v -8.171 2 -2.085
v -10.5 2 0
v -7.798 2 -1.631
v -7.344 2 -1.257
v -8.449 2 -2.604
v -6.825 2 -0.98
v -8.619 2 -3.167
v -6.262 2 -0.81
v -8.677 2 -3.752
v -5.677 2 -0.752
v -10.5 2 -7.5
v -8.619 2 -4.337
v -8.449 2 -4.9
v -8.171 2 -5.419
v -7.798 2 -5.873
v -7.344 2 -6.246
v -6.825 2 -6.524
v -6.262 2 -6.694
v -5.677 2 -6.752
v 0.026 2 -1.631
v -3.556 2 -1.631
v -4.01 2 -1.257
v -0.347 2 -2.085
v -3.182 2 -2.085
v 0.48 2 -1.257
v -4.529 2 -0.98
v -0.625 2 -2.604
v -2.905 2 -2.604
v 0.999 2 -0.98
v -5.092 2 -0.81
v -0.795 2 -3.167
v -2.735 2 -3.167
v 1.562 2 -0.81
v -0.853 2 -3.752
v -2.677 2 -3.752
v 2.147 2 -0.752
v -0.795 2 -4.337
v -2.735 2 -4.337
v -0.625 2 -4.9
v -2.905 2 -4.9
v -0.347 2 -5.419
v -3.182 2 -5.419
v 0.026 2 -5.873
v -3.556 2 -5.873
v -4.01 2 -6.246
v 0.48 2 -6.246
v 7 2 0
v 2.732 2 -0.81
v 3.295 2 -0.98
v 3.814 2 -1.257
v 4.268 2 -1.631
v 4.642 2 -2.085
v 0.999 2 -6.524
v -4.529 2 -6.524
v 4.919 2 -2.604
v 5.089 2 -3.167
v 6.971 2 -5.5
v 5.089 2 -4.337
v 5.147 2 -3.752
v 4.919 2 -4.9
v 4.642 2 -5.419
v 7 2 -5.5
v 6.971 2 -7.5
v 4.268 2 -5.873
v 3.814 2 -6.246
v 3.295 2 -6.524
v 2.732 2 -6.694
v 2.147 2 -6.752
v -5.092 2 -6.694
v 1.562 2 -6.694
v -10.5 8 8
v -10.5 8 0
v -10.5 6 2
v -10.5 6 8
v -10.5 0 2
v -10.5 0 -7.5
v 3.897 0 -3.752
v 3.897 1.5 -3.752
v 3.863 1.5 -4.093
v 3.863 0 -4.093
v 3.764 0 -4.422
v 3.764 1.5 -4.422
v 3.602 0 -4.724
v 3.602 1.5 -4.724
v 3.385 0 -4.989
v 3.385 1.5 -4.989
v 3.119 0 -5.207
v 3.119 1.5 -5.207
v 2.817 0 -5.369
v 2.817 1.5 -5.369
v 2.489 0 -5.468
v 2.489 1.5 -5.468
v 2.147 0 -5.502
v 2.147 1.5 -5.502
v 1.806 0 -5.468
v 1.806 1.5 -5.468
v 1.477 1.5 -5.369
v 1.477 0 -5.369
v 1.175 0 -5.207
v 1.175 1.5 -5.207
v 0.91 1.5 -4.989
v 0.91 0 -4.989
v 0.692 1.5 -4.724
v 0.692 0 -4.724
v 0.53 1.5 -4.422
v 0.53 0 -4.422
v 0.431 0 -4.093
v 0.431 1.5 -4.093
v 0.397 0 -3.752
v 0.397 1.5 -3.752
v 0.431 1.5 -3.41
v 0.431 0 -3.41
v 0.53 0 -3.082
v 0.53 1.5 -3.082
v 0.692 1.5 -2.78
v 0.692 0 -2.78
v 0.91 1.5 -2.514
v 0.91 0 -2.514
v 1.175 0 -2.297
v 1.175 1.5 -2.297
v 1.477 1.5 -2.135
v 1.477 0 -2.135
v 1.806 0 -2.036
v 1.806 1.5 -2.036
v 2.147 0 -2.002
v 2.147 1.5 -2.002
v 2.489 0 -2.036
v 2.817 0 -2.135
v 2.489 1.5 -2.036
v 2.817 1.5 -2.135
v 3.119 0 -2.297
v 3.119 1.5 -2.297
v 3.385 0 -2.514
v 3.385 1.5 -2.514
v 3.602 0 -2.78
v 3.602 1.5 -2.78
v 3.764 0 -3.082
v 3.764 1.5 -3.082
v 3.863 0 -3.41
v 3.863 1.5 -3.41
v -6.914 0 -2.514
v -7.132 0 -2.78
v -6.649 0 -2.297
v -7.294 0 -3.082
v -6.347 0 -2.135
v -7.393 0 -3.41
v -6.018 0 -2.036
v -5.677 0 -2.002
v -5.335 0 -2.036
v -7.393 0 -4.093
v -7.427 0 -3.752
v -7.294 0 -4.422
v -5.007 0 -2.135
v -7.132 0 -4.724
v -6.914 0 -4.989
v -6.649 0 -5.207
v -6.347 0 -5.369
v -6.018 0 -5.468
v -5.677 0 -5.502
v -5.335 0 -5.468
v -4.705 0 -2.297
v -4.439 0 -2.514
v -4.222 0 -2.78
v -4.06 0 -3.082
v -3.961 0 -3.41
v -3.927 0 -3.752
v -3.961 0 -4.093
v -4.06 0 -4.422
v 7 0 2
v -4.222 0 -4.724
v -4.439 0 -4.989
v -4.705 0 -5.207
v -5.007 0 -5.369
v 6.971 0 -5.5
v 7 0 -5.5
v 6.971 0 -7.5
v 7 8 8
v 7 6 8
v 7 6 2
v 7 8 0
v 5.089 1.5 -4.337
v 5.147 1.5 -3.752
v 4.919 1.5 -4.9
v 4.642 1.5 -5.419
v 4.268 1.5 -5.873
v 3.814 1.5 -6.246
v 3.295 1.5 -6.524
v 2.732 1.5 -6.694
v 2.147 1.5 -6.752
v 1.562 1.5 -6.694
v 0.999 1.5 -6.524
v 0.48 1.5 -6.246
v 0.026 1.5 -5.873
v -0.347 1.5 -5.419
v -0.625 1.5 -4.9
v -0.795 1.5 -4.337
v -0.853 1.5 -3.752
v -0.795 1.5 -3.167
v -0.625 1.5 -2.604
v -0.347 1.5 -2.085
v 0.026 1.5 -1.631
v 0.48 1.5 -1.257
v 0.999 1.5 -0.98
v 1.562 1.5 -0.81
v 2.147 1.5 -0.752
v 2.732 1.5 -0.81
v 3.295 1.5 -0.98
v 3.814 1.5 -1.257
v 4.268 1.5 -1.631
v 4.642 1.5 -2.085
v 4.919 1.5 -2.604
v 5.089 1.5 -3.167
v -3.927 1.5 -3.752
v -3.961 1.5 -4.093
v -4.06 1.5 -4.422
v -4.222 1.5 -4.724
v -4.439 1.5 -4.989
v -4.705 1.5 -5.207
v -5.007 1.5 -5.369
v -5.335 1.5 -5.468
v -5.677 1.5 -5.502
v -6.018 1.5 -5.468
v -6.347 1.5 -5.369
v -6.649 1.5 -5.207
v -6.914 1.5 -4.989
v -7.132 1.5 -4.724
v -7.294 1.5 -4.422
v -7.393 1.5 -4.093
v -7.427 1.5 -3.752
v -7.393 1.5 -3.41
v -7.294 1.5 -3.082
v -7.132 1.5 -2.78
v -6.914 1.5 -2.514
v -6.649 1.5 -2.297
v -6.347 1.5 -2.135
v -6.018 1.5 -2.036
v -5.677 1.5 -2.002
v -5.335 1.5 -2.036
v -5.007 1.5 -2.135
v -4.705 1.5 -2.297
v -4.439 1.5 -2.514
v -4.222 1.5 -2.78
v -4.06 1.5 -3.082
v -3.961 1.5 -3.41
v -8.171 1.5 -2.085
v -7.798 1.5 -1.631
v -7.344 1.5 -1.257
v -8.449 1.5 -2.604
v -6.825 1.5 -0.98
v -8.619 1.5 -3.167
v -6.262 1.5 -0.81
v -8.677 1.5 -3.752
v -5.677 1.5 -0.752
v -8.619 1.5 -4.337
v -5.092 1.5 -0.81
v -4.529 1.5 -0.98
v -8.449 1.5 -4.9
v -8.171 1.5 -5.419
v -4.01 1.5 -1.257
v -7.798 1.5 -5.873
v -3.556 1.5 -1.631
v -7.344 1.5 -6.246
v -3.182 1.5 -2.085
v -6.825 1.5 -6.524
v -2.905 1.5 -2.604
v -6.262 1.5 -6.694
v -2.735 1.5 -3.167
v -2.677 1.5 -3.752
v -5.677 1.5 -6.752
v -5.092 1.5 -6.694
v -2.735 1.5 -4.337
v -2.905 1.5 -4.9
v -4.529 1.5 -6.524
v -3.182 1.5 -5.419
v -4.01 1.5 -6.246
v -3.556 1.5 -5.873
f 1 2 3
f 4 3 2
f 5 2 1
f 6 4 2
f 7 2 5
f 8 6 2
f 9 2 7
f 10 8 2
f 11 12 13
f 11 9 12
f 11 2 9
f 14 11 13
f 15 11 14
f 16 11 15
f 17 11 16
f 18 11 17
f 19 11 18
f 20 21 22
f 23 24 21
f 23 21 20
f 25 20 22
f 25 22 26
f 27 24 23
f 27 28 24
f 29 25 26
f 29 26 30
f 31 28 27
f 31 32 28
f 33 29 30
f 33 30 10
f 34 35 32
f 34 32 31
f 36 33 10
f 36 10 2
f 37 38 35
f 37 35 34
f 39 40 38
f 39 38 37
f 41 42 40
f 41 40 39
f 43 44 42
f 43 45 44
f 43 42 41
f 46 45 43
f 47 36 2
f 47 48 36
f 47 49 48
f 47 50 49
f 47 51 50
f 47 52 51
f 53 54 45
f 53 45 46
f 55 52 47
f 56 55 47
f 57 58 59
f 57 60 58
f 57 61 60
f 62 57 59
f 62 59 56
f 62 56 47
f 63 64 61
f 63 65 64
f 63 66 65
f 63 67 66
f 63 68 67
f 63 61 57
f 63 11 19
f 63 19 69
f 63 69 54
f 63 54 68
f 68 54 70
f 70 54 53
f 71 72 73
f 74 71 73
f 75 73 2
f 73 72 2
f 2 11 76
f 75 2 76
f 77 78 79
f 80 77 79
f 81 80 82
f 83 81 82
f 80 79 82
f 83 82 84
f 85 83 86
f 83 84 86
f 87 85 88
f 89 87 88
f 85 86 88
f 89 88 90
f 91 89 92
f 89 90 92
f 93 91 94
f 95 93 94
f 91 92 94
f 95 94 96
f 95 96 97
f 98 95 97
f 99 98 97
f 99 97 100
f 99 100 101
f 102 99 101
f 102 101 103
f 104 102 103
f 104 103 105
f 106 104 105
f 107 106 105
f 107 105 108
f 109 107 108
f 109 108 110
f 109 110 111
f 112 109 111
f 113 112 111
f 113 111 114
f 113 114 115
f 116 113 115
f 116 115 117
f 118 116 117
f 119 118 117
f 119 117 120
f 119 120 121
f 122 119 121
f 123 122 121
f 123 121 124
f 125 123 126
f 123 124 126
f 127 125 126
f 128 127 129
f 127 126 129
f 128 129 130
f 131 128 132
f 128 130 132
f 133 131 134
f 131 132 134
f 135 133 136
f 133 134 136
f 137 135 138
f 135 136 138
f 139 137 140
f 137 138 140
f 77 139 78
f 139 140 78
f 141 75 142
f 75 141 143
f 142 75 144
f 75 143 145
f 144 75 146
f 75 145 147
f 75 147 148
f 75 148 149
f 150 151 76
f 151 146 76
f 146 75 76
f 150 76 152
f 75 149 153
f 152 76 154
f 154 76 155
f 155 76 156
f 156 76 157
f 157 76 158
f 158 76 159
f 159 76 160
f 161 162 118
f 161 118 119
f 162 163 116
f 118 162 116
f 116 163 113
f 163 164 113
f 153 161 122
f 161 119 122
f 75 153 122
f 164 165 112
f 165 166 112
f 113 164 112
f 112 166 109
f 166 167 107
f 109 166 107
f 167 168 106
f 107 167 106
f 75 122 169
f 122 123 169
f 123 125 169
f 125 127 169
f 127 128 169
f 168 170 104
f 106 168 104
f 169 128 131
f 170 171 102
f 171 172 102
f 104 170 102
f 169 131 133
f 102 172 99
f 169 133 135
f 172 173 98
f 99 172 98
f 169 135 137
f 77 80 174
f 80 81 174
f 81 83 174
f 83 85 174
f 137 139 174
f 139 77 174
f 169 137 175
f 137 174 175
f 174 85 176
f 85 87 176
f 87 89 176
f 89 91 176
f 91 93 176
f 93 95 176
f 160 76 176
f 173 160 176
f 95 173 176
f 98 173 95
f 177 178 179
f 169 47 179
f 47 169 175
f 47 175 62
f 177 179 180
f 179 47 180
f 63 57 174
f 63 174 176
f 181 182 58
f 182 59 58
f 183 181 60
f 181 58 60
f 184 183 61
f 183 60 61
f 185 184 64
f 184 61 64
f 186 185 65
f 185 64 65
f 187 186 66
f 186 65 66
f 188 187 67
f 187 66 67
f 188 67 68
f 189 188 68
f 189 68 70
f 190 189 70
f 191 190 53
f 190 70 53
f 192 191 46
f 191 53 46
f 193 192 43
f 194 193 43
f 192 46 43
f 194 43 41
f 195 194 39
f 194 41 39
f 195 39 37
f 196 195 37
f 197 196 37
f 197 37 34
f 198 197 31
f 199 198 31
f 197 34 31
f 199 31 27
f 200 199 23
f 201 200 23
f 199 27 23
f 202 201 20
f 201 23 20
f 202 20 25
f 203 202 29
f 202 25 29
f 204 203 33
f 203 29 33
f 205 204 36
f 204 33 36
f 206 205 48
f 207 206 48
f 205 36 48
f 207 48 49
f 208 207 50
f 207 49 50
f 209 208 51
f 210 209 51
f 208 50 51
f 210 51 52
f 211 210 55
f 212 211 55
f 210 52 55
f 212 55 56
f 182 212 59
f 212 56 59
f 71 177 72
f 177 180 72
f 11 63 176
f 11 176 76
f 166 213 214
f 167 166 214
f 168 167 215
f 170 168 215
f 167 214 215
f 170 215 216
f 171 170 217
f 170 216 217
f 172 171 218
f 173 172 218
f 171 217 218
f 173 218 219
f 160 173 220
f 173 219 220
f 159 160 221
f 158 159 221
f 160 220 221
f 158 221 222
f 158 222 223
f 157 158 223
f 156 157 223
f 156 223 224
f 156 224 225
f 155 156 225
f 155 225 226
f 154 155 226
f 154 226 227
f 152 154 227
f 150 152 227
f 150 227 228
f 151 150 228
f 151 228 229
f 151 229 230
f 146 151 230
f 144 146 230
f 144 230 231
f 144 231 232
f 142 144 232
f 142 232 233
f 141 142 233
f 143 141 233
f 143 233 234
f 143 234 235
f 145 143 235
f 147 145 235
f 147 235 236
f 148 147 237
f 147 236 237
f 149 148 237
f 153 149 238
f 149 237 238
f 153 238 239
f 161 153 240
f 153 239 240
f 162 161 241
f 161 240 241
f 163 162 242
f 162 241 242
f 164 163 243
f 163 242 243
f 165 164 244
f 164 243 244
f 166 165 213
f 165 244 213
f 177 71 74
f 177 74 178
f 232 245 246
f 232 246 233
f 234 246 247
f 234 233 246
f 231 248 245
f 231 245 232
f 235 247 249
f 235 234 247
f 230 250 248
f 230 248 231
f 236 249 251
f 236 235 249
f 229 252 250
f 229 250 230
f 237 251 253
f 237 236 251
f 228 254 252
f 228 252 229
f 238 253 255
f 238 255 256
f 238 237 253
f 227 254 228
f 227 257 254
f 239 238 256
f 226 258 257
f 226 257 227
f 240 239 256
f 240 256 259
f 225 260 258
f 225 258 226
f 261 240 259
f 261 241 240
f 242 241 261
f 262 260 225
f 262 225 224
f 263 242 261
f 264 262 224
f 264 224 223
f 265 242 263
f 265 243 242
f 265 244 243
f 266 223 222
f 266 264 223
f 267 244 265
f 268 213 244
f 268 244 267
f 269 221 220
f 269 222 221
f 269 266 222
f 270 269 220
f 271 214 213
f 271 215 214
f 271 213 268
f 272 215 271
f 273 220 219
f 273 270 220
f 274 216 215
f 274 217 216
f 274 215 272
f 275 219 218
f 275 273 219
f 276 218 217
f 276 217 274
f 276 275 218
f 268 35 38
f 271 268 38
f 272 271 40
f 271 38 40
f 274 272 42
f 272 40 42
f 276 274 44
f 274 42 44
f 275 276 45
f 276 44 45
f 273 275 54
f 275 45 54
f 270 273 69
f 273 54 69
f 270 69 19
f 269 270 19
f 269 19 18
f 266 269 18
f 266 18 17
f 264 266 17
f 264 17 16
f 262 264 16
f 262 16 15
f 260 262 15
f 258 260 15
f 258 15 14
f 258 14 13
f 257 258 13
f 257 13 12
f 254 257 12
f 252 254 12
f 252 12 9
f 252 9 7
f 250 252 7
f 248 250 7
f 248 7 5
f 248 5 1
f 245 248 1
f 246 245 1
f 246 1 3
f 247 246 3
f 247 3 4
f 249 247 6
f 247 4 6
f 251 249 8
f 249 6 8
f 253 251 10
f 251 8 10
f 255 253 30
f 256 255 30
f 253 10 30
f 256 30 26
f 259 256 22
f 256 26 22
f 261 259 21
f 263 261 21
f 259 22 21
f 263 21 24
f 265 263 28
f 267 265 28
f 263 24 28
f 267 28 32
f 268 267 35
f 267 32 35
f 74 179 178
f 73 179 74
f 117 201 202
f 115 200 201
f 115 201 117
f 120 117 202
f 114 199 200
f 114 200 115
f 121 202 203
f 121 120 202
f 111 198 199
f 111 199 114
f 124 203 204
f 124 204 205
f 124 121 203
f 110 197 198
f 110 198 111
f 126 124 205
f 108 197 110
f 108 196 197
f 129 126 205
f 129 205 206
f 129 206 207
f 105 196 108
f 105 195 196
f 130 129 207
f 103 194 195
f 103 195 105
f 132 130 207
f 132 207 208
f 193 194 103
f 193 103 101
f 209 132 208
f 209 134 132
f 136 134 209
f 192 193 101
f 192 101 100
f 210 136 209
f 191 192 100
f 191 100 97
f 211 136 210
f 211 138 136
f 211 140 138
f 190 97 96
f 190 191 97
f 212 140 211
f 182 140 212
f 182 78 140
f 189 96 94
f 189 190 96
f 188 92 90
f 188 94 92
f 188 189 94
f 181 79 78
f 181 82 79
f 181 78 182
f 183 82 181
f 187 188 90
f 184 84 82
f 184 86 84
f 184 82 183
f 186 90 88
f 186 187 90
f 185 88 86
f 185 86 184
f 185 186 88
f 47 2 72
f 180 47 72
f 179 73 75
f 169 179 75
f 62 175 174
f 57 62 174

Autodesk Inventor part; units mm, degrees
ref_plane "YZ Plane" through (0, 0, 0) normal (1, 0, 0) x (0, 1, 0)
ref_plane "XZ Plane" through (0, 0, 0) normal (0, 1, 0) x (-1, 0, 0)
ref_plane "XY Plane" through (0, 0, 0) normal (0, 0, 1) x (1, 0, 0)
sketch "Boceto1" plane through (0, 0, 0) normal (0, 1, 0) x (-1, 0, 0)
  line L0 (0, 0) -> (3.5, 0)
  line L1 (3.5, 0) -> (5.5, 0)
  line L2 (0, 0) -> (-2, 0)
  line L3 (-2, -5.5) -> (5.5, -5.5)
  line L4 (-2, 0) -> (-5, 0)
  line L5 (-5, -5.5) -> (-2, -5.5)
  line L6 (5.5, 0) -> (8.5, 0)
  line L7 (8.5, -5.5) -> (5.5, -5.5)
  line L8 (8.5, -5.5) -> (9.5, -5.5)
  line L9 (9.5, 0) -> (8.5, 0)
  line L10 (-5, -5.5) -> (-6, -5.5)
  line L11 (-6, 0) -> (-5, 0)
  line L12 (9.5, -5.5) -> (10.5, -5.5)
  line L13 (10.5, -5.5) -> (10.5, 0)
  line L14 (10.5, 0) -> (9.5, 0)
  line L15 (-6, -5.5) -> (-7, -5.5)
  line L16 (-7, -5.5) -> (-7, 0)
  line L17 (-7, 0) -> (-6, 0)
  dimension "d30" = 1
  dimension "d37" = 1
  dimension "d38" = 1
extrude "Extrusión3" add sketch "Boceto1" along normal blind 2
sketch "Boceto4" plane through (-8.5, 0, 0) normal (0, 0, 1) x (1, 0, 0)
  line L0 (15.5, 2) -> (-2, 2) projected
  line L1 (0, 2) -> (13.5, 2)
  line L2 (13.5, 2) -> (13.5, 0)
  line L3 (13.5, 0) -> (0, 0)
  line L4 (0, 0) -> (0, 2)
  point P0 (8.5, 0)
  point P1 (14.5, 2)
  point P2 (-1, 2)
extrude "Extrusión4" add sketch "Boceto4" along normal blind 2
sketch "Boceto5" plane through (0, 2, 0) normal (0, 1, 0) x (1, 0, 0)
  line L0 (-8.5, -2) -> (5, -2) projected
  line L1 (5, -2) -> (-8.5, -2)
  line L2 (-8.5, -2) -> (-8.5, 0)
  line L3 (-8.5, 0) -> (5, 0)
  line L4 (5, 0) -> (5, -2)
  point P0 (0, 0)
extrude "Extrusión5" add sketch "Boceto5" along normal blind 6
sketch "Boceto6" plane through (-8.5, 0, 2) normal (0, 0, 1) x (1, 0, 0)
  line L0 (0, 0) -> (13.5, 0) projected
  line L1 (13.5, 0) -> (13.5, 6)
  line L2 (13.5, 6) -> (0, 6)
  line L3 (0, 0) -> (0, 6)
  line L4 (0, 0) -> (13.5, 0)
  line L5 (0, 0) -> (0, 8) projected
  line L6 (0, 8) -> (13.5, 8)
  line L7 (13.5, 8) -> (13.5, 6)
  line L8 (13.5, 6) -> (0, 6)
  line L9 (0, 6) -> (0, 8)
  point P0 (8.5, 0)
extrude "Extrusión6" add sketch "Boceto6" along normal blind 5 contours L5 L6 L7 L2
sketch "Boceto8" plane through (5, 0, -5.5) normal (0, 0, -1) x (-1, 0, 0)
  line L0 (13.5, 0) -> (13.5, 6) projected
  line L1 (13.5, 2) -> (0, 2) projected
  line L2 (13.5, 0) -> (0, 0)
  line L3 (0, 0) -> (0, 2)
  line L4 (0, 2) -> (13.5, 2)
  line L5 (13.5, 2) -> (13.5, 0)
  point P0 (5, 0)
extrude "Extrusión8" add sketch "Boceto8" along normal blind 2
sketch "Boceto11" plane through (5, 0, 2) normal (1, 0, 0) x (0, 0, -1)
  line L0 (-5, 8) -> (2, 8)
  line L1 (2, 8) -> (2, 6)
  line L2 (-5, 6) -> (-5, 8)
  line L3 (0, 0) -> (0, 6) projected
  line L4 (2, 0) -> (2, 2) projected
  line L5 (2, 6) -> (2, 0)
  line L6 (2, 0) -> (0, 0)
  line L7 (0, 0) -> (0, 6)
  line L8 (0, 6) -> (-5, 6) projected
  line L9 (0, 6) -> (-5, 6)
  line L10 (2, 0) -> (0, 0) projected
  line L11 (0, 0) -> (2, 0)
  line L12 (2, 2) -> (2, 8) projected
  line L13 (2, 0) -> (2, 8)
  line L14 (2, 8) -> (-5, 8) projected
  line L15 (2, 8) -> (-5, 8)
  line L16 (-5, 8) -> (-5, 6)
  line L17 (0, 6) -> (0, 0)
extrude "Extrusión11" add sketch "Boceto11" along normal blind 2
sketch "Boceto12" plane through (-8.5, 0, 0) normal (-1, 0, 0) x (0, 0, 1)
  line L0 (0, 8) -> (7, 8) projected
  line L1 (7, 8) -> (7, 6)
  line L2 (2, 6) -> (7, 6) projected
  line L3 (7, 6) -> (2, 6)
  line L4 (2, 6) -> (2, 0)
  line L5 (0, 0) -> (2, 0) projected
  line L6 (2, 0) -> (0, 0)
  line L7 (0, 2) -> (0, 8) projected
  line L8 (0, 0) -> (0, 8)
  line L9 (0, 8) -> (7, 8)
extrude "Extrusión12" add sketch "Boceto12" along normal blind 2
sketch "Boceto13" plane through (0, 2, 0) normal (0, 1, 0) x (1, 0, 0)
  line L0 (-8.5, 5.5) -> (-10.5, 5.5) projected
  line L1 (-10.5, 5.5) -> (6.9708, 5.5)
  line L2 (6.9708, 5.5) -> (6.9708, 7.5)
  line L3 (6.9708, 7.5) -> (-10.5, 7.5)
  line L4 (-10.5, 7.5) -> (-10.5, 5.5)
  point P0 (0, 0)
extrude "Extrusión13" add sketch "Boceto13" against normal blind 2
sketch "Boceto14" plane through (0, 2, 0) normal (0, 1, 0) x (1, 0, 0)
  circle A0 centre (2.1471, 3.7519) radius 1.75
  circle A1 centre (-5.6769, 3.7519) radius 1.75
  line L0 (1.1471, 3.7519) -> (2.1471, 3.7519)
  line L1 (-4.6769, 3.7519) -> (-5.6769, 3.7519)
  point P0 (0, 0)
  dimension "d43" = 3.5
  dimension "d44" = 3.5
  dimension "d45" = 1
  dimension "d46" = 1
extrude "Extrusión14" cut sketch "Boceto14" against normal blind 2
sketch "Boceto15" plane through (0, 2, 0) normal (0, 1, 0) x (1, 0, 0)
  circle A0 centre (2.1471, 3.7519) radius 1.75 projected
  circle A1 centre (2.1471, 3.7519) radius 3
  circle A2 centre (-5.6769, 3.7519) radius 1.75 projected
  circle A3 centre (-5.6769, 3.7519) radius 3
  point P0 (0, 0)
  dimension "d49" = 6
  dimension "d50" = 6
extrude "Extrusión15" cut sketch "Boceto15" against normal blind 0.5
sketch "Boceto16" plane through (-8.5, 0, 7) normal (0, 0, 1) x (1, 0, 0)
  line L0 (15.5, 2) -> (15.5, 8) projected
  line L1 (15.5, 6) -> (-2, 6) projected
  line L2 (15.5, 8) -> (-2, 8)
  line L3 (-2, 8) -> (-2, 6)
  line L4 (-2, 6) -> (15.5, 6)
  line L5 (15.5, 6) -> (15.5, 8)
  point P0 (8.5, 0)
extrude "Extrusión16" add sketch "Boceto16" along normal blind 1
properties part number "Pantalla - encaix slider"
